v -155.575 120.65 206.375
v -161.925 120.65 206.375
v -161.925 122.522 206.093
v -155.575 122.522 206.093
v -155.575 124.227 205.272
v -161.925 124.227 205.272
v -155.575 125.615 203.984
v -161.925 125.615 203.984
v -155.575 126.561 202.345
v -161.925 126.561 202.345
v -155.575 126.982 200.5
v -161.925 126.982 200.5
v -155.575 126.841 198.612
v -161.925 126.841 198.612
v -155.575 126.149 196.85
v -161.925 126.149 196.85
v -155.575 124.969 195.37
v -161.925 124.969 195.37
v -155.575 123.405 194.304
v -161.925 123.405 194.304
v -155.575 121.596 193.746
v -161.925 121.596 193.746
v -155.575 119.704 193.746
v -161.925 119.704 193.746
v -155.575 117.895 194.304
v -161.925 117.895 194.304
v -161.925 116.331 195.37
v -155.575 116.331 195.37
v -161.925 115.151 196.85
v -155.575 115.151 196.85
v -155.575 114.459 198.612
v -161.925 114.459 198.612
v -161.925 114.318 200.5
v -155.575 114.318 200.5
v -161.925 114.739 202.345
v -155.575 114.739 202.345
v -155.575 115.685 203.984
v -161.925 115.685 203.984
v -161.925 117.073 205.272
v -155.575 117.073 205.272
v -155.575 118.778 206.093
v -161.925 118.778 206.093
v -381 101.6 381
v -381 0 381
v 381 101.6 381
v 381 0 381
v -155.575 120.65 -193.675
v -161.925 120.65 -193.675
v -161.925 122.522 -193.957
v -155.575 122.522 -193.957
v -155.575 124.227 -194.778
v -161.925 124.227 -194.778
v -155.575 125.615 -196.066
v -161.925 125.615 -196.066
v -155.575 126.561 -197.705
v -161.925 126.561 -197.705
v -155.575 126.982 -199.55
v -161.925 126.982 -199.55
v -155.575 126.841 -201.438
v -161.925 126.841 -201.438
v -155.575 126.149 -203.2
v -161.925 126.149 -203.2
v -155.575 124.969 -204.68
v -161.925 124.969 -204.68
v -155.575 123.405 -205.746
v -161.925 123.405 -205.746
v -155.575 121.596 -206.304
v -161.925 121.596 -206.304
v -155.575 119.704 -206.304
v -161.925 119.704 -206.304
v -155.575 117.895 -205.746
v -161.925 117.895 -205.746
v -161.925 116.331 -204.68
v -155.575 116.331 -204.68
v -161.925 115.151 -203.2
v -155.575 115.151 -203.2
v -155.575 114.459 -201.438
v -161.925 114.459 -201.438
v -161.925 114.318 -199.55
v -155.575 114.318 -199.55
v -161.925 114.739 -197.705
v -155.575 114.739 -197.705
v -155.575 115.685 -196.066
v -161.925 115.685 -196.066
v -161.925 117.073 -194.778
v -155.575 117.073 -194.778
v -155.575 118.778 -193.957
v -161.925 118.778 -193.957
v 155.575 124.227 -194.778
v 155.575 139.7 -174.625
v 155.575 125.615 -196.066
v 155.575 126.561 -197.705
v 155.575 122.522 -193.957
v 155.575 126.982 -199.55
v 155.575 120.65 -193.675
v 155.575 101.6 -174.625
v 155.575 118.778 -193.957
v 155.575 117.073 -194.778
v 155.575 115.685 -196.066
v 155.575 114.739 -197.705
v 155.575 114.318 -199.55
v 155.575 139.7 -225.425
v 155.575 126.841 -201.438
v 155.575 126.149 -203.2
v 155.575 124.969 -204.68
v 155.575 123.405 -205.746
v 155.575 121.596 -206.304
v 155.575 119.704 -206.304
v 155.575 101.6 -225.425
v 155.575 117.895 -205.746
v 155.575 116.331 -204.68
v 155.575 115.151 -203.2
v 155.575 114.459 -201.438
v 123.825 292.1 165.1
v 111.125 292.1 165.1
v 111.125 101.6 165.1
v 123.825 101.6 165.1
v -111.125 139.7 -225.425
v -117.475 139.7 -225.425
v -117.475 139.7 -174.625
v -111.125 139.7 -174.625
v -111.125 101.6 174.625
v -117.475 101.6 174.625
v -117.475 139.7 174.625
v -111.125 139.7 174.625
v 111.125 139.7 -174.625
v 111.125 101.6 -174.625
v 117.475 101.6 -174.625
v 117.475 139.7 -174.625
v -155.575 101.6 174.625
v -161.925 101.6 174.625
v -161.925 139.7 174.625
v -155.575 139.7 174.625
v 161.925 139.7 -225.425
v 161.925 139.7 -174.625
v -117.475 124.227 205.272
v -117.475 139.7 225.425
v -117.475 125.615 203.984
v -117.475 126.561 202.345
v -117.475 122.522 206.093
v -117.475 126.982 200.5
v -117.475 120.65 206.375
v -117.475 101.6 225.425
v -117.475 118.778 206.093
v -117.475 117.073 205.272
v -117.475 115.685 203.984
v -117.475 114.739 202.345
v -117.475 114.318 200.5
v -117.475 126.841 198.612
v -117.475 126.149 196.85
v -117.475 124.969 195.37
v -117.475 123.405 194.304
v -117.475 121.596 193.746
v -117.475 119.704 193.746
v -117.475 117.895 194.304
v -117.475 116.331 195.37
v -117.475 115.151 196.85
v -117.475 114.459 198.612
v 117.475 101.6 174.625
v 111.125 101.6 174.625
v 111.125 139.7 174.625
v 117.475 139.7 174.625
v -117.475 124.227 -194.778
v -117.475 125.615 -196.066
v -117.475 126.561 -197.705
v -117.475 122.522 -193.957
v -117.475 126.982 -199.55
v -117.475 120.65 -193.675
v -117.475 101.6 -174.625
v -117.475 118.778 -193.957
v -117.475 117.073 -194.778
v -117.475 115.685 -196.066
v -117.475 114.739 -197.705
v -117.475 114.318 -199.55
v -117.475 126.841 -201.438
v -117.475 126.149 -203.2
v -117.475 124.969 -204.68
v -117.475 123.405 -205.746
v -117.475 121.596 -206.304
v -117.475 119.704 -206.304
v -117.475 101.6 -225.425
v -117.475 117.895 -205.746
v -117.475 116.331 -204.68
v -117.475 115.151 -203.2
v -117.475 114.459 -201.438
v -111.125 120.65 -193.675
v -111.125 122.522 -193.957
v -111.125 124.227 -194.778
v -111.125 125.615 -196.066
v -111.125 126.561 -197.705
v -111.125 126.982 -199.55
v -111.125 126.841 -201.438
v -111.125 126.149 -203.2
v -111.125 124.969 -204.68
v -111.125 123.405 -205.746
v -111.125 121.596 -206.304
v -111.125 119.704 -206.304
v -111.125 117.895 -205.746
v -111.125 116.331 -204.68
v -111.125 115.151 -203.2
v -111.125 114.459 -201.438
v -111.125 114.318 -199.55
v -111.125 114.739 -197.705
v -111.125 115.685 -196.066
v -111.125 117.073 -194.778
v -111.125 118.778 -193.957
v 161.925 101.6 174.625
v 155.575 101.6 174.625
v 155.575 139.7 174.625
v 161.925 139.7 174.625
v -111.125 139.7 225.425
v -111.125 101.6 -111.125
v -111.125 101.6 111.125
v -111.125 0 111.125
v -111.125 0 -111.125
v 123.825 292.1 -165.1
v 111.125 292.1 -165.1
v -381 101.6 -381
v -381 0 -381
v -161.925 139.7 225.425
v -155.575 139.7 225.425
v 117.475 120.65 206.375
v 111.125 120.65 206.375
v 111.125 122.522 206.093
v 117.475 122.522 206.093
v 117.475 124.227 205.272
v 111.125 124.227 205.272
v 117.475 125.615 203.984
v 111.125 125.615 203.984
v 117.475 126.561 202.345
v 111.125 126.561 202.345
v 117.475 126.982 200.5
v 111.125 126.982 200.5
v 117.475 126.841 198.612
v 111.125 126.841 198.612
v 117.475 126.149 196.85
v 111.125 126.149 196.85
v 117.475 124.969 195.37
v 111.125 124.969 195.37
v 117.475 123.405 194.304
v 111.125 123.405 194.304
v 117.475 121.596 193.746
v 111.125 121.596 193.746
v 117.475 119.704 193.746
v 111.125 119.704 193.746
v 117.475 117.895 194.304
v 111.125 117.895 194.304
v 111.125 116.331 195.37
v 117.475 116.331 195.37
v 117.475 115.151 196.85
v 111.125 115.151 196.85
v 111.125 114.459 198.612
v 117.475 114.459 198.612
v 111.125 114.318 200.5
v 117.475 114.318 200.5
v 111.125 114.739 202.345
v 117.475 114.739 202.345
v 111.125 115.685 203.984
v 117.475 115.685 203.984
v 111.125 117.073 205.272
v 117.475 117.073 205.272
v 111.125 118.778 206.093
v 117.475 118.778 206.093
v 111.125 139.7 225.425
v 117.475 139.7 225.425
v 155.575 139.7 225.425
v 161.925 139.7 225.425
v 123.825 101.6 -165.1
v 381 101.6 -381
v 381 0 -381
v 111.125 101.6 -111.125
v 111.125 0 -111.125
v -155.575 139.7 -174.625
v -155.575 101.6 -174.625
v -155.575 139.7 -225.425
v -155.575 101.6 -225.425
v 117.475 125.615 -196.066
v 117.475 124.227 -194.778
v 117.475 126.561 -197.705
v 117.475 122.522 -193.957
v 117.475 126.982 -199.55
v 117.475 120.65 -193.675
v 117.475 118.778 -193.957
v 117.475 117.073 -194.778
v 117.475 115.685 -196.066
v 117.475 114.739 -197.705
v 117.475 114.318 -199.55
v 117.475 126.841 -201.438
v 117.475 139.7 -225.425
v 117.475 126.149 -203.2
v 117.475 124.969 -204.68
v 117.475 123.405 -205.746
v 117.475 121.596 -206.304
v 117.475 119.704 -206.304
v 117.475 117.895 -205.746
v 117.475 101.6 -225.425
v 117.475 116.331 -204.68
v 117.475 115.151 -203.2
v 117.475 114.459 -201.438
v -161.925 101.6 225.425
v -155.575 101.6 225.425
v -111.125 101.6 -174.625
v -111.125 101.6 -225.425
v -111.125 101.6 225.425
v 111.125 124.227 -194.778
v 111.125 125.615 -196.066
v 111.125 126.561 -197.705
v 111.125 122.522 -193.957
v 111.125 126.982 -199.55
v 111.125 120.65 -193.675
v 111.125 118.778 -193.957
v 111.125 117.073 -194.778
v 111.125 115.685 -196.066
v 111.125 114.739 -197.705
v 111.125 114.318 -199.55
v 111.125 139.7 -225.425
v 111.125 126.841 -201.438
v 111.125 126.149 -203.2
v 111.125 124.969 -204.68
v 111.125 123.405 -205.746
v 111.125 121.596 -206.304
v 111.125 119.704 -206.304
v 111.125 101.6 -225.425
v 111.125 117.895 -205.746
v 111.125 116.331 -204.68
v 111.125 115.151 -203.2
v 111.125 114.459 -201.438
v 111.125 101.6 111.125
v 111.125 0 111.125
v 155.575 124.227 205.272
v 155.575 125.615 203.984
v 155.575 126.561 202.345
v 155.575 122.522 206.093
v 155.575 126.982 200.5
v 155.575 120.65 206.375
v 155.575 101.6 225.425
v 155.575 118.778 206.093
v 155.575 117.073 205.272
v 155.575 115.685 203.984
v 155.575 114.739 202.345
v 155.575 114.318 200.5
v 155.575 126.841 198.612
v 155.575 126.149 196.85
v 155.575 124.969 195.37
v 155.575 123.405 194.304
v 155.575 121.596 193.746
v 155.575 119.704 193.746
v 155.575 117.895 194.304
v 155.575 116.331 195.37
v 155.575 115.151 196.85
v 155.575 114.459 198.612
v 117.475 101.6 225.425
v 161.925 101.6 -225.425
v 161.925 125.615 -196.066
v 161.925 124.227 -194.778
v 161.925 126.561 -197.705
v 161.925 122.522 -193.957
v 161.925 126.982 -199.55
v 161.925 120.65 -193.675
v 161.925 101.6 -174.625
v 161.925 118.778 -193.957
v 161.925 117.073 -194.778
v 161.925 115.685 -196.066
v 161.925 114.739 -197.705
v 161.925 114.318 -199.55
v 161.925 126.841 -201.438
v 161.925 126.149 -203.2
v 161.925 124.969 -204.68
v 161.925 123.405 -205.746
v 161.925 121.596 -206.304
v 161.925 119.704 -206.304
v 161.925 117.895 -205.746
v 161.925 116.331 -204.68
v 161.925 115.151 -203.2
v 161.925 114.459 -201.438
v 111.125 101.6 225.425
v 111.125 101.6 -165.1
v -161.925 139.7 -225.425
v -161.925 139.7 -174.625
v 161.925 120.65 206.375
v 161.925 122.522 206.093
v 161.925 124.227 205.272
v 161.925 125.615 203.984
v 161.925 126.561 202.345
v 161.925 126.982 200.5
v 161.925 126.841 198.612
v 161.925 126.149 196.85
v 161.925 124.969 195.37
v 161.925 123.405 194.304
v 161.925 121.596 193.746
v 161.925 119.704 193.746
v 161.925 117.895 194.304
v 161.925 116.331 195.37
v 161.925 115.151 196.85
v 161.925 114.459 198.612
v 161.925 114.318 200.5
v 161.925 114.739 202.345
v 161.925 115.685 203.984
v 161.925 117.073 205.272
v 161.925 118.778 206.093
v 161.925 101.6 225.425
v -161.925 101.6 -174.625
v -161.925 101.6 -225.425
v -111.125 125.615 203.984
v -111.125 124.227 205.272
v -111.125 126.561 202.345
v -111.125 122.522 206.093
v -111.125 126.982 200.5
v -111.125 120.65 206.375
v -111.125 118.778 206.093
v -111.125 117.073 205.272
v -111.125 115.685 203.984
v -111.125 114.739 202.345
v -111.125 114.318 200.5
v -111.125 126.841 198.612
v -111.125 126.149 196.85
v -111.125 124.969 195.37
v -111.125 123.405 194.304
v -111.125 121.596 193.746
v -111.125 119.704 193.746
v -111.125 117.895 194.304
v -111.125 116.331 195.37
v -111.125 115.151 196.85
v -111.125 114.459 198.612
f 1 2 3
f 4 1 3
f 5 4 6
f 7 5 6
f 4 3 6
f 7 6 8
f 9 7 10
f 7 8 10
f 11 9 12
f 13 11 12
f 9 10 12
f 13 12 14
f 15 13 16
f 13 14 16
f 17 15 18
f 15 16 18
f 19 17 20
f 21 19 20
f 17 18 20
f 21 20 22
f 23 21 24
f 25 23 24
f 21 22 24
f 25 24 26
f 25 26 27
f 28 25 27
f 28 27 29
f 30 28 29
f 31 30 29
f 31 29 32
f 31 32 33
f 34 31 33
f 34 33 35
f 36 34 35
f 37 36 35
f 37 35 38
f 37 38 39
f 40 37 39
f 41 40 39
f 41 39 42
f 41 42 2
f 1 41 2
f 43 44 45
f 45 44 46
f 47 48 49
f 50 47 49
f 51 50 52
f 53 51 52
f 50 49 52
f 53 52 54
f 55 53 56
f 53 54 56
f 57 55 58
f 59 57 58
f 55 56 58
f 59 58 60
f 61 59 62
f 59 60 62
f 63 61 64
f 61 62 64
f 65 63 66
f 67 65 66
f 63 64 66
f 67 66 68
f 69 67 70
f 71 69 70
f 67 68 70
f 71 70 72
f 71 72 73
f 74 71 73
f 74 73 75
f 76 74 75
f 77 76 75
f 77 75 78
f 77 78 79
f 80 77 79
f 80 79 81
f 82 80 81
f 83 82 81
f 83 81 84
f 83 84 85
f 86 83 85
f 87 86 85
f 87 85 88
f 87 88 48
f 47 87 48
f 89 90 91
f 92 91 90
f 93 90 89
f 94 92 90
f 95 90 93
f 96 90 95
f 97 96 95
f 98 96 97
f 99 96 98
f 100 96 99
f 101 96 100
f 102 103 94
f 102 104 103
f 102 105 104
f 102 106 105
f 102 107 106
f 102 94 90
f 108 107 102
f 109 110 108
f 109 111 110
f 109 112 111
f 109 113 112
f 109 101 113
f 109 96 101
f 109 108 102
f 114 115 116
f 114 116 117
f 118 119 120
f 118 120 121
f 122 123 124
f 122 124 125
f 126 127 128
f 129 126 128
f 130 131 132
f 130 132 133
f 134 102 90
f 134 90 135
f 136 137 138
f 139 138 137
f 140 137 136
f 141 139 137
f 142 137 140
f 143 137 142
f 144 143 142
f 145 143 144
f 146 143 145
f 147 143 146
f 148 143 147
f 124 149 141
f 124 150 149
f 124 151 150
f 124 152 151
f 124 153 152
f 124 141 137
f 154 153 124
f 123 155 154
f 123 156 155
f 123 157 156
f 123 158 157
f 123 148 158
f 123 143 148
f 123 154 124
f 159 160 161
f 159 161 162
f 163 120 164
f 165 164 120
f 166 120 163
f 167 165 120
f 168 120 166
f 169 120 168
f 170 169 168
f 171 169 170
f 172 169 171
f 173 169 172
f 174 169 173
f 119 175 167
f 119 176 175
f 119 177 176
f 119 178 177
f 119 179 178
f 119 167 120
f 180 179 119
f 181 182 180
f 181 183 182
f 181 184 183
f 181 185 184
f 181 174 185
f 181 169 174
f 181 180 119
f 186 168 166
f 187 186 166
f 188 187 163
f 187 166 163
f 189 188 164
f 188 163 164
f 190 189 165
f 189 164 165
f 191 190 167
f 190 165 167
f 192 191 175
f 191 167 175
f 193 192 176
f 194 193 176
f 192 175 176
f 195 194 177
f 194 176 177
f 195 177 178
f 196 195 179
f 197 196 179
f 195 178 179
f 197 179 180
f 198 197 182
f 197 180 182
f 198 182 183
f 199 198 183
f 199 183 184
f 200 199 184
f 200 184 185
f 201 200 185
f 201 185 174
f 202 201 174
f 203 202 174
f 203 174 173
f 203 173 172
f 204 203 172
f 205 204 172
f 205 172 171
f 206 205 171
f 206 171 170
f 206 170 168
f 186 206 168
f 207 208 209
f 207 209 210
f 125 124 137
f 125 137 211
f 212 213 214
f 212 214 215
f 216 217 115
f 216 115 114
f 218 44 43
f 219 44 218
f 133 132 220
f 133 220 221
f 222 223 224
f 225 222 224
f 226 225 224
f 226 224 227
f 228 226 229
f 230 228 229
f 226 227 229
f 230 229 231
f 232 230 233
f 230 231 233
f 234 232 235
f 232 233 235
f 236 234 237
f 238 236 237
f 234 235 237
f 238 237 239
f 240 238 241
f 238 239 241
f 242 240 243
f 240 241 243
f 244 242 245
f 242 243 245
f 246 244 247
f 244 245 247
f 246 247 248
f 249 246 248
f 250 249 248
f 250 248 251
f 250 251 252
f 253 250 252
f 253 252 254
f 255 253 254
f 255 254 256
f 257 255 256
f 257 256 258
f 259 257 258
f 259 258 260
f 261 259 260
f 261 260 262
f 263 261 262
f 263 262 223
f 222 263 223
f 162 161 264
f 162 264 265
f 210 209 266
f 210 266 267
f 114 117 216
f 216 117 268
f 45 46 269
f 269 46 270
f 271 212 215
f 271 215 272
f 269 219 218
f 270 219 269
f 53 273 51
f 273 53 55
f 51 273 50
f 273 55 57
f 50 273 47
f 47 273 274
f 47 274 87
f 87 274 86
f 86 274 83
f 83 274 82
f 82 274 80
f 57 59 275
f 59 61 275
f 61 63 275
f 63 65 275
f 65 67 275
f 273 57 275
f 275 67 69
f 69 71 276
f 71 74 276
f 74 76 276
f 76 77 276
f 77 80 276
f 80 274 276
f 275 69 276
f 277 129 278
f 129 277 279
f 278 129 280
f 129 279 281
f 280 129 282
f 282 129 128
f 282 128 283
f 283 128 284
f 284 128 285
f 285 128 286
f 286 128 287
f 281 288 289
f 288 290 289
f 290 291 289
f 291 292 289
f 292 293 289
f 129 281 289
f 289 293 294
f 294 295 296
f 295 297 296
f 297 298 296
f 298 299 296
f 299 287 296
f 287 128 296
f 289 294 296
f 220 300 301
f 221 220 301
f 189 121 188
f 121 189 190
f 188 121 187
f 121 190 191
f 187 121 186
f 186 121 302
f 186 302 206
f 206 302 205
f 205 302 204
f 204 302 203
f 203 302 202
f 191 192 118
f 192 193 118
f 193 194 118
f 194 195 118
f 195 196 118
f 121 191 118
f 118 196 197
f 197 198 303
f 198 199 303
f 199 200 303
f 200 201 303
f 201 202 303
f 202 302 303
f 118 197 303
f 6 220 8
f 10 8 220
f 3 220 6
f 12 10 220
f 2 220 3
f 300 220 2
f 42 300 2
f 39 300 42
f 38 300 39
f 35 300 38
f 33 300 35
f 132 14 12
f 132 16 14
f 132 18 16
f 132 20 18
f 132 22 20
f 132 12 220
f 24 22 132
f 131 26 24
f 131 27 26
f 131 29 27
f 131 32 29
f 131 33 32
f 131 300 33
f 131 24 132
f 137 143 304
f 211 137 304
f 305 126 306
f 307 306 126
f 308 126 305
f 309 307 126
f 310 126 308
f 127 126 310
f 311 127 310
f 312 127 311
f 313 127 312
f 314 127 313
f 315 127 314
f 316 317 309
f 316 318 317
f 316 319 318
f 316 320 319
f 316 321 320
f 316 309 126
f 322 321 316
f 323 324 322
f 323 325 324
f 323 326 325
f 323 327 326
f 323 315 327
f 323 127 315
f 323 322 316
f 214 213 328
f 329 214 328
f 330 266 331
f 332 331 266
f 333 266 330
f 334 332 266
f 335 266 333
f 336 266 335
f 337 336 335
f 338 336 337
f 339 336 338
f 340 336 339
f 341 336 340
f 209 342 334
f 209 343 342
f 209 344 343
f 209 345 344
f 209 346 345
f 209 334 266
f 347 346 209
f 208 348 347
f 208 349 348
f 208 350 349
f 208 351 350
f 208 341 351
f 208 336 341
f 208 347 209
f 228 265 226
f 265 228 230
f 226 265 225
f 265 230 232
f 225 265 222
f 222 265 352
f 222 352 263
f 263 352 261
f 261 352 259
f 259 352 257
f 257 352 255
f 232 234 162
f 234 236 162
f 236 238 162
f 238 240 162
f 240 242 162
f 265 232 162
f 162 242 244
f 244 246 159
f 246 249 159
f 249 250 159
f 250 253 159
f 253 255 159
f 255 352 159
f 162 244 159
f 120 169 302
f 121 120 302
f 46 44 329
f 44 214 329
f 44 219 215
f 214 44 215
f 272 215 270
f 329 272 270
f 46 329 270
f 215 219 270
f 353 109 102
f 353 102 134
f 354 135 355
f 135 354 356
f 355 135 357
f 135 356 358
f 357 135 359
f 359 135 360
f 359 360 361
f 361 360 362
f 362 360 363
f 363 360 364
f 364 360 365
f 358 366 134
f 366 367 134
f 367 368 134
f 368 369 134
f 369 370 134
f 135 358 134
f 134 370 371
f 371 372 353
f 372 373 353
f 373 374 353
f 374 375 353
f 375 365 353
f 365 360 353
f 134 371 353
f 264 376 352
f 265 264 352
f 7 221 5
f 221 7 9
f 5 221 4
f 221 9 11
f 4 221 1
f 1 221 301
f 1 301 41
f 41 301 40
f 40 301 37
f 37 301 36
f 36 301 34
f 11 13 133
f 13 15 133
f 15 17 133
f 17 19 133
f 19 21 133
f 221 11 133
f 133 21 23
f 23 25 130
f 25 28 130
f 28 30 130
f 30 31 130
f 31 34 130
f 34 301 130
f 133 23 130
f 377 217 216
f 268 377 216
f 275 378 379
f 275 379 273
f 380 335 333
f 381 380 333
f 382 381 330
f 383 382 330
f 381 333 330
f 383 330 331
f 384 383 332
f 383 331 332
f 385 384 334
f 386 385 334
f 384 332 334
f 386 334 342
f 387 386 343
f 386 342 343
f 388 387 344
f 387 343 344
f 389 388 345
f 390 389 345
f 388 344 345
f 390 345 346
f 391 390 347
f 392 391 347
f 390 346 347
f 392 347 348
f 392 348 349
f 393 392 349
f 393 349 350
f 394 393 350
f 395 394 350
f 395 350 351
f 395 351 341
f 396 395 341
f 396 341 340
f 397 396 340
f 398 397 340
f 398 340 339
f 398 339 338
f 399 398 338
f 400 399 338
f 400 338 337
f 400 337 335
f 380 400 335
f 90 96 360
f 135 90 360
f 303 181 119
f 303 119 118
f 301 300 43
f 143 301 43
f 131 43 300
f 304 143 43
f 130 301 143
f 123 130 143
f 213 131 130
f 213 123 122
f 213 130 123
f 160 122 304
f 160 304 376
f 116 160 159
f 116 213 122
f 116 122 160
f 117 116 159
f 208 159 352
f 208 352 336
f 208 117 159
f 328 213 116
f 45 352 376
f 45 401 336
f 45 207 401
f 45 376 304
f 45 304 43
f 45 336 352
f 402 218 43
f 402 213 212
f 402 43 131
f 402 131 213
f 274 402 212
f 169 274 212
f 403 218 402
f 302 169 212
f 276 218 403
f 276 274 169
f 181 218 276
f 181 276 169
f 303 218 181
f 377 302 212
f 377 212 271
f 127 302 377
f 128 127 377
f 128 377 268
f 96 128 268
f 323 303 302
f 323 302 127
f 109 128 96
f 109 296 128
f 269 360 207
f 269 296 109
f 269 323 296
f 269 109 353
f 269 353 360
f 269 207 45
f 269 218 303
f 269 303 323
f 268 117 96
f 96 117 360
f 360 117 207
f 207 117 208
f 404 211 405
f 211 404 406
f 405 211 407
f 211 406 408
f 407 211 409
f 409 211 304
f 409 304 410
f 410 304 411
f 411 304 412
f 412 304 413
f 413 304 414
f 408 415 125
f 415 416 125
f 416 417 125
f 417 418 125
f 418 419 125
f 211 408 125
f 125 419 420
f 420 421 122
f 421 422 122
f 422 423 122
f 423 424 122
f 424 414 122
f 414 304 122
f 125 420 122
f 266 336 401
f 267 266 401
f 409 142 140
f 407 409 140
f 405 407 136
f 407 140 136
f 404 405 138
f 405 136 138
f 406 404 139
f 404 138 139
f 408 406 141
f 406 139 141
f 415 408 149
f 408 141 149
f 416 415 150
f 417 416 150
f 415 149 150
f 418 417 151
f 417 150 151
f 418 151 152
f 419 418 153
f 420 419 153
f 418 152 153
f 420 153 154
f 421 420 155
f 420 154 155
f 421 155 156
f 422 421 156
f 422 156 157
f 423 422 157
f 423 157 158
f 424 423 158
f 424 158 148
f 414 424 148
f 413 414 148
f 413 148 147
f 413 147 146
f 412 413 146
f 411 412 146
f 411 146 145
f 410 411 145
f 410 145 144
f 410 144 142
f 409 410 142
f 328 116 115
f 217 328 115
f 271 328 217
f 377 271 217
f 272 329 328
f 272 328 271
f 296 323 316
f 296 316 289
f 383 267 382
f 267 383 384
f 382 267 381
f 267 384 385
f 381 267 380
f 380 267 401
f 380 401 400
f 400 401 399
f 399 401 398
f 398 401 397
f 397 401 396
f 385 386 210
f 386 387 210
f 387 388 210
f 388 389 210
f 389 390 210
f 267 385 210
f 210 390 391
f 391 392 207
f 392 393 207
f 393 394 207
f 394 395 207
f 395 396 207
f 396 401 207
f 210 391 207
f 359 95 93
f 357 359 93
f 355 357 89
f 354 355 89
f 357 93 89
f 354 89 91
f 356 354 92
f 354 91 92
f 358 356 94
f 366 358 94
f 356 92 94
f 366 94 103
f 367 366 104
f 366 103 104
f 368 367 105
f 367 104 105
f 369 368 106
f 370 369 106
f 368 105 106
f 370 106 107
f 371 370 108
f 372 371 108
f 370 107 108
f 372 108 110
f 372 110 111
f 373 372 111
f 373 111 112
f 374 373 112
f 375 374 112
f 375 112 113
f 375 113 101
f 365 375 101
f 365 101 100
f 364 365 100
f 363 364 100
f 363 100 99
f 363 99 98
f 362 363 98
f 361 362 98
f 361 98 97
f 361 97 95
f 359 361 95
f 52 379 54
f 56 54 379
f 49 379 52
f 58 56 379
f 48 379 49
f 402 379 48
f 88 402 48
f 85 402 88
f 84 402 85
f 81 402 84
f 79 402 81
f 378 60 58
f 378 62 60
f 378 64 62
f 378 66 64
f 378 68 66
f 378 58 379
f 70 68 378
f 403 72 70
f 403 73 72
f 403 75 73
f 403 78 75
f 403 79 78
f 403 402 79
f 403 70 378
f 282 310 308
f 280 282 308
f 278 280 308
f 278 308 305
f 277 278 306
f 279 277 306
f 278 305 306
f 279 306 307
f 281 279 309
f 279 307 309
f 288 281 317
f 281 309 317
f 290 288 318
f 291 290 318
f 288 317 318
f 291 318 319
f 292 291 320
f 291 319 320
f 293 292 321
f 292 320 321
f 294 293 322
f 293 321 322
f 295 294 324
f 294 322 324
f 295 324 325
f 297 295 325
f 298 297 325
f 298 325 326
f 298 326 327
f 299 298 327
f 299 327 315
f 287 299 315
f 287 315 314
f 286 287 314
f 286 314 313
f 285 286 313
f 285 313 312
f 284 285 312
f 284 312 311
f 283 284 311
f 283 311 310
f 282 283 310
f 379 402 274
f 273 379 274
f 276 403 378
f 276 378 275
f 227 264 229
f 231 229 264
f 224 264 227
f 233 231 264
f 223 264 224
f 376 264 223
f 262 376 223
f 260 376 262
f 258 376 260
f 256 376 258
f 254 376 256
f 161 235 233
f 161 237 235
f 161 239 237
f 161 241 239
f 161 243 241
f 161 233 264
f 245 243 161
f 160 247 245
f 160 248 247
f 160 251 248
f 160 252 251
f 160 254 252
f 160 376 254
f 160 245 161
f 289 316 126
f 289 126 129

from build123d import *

# Parameters (mm, degrees)
SKETCH1_W           = 762
SKETCH1_H           = 762
BOSS_EXTRUDE1_DEPTH = 101.6
SKETCH2_W           = 222.25
SKETCH2_H           = 222.25
CUT_EXTRUDE1_DEPTH  = 102.6
SKETCH3_W           = 12.7
SKETCH3_H           = 330.2
BOSS_EXTRUDE2_DEPTH = 190.5
SKETCH4_W           = 6.35
SKETCH4_H           = 50.8
BOSS_EXTRUDE3_DEPTH = 38.1
SKETCH6_R           = 6.35
CUT_EXTRUDE2_DEPTH  = 543.925


with BuildPart() as part:
    # Sketch1 → Boss-Extrude1 (new body)
    with BuildSketch(Plane(origin=(0, 0, 0), x_dir=(1, 0, 0), z_dir=(0, 1, 0))):
        Rectangle(SKETCH1_W, SKETCH1_H)
    extrude(amount=BOSS_EXTRUDE1_DEPTH)

    # Sketch2 → Cut-Extrude1 (cut, through all)
    with BuildSketch(Plane(origin=(0, 101.6, 0), x_dir=(1, 0, 0), z_dir=(0, 1, 0))):
        Rectangle(SKETCH2_W, SKETCH2_H)
    extrude(amount=-CUT_EXTRUDE1_DEPTH, mode=Mode.SUBTRACT)

    # Sketch3 → Boss-Extrude2 (add)
    with BuildSketch(Plane(origin=(0, 101.6, 0), x_dir=(1, 0, 0), z_dir=(0, 1, 0))):
        with Locations((117.475, 0)):
            Rectangle(SKETCH3_W, SKETCH3_H)
    extrude(amount=BOSS_EXTRUDE2_DEPTH)

    # Sketch4 → Boss-Extrude3 (add)
    with BuildSketch(Plane(origin=(0, 101.6, 0), x_dir=(1, 0, 0), z_dir=(0, 1, 0))):
        with Locations((-158.75, -200.025)):
            Rectangle(SKETCH4_W, SKETCH4_H)
        with Locations((-114.3, -200.025)):
            Rectangle(SKETCH4_W, SKETCH4_H)
        with Locations((114.3, -200.025)):
            Rectangle(SKETCH4_W, SKETCH4_H)
        with Locations((158.75, -200.025)):
            Rectangle(SKETCH4_W, SKETCH4_H)
        with Locations((158.75, 200.025)):
            Rectangle(SKETCH4_W, SKETCH4_H)
        with Locations((114.3, 200.025)):
            Rectangle(SKETCH4_W, SKETCH4_H)
        with Locations((-114.3, 200.025)):
            Rectangle(SKETCH4_W, SKETCH4_H)
        with Locations((-158.75, 200.025)):
            Rectangle(SKETCH4_W, SKETCH4_H)
    extrude(amount=BOSS_EXTRUDE3_DEPTH)

    # Sketch6 → Cut-Extrude2 (cut, through all)
    with BuildSketch(Plane.ZY.offset(161.925)):
        with Locations((-200.025, 120.65)):
            Circle(SKETCH6_R)
        with Locations((200.025, 120.65)):
            Circle(SKETCH6_R)
    extrude(amount=-CUT_EXTRUDE2_DEPTH, mode=Mode.SUBTRACT)


solid = part.part
